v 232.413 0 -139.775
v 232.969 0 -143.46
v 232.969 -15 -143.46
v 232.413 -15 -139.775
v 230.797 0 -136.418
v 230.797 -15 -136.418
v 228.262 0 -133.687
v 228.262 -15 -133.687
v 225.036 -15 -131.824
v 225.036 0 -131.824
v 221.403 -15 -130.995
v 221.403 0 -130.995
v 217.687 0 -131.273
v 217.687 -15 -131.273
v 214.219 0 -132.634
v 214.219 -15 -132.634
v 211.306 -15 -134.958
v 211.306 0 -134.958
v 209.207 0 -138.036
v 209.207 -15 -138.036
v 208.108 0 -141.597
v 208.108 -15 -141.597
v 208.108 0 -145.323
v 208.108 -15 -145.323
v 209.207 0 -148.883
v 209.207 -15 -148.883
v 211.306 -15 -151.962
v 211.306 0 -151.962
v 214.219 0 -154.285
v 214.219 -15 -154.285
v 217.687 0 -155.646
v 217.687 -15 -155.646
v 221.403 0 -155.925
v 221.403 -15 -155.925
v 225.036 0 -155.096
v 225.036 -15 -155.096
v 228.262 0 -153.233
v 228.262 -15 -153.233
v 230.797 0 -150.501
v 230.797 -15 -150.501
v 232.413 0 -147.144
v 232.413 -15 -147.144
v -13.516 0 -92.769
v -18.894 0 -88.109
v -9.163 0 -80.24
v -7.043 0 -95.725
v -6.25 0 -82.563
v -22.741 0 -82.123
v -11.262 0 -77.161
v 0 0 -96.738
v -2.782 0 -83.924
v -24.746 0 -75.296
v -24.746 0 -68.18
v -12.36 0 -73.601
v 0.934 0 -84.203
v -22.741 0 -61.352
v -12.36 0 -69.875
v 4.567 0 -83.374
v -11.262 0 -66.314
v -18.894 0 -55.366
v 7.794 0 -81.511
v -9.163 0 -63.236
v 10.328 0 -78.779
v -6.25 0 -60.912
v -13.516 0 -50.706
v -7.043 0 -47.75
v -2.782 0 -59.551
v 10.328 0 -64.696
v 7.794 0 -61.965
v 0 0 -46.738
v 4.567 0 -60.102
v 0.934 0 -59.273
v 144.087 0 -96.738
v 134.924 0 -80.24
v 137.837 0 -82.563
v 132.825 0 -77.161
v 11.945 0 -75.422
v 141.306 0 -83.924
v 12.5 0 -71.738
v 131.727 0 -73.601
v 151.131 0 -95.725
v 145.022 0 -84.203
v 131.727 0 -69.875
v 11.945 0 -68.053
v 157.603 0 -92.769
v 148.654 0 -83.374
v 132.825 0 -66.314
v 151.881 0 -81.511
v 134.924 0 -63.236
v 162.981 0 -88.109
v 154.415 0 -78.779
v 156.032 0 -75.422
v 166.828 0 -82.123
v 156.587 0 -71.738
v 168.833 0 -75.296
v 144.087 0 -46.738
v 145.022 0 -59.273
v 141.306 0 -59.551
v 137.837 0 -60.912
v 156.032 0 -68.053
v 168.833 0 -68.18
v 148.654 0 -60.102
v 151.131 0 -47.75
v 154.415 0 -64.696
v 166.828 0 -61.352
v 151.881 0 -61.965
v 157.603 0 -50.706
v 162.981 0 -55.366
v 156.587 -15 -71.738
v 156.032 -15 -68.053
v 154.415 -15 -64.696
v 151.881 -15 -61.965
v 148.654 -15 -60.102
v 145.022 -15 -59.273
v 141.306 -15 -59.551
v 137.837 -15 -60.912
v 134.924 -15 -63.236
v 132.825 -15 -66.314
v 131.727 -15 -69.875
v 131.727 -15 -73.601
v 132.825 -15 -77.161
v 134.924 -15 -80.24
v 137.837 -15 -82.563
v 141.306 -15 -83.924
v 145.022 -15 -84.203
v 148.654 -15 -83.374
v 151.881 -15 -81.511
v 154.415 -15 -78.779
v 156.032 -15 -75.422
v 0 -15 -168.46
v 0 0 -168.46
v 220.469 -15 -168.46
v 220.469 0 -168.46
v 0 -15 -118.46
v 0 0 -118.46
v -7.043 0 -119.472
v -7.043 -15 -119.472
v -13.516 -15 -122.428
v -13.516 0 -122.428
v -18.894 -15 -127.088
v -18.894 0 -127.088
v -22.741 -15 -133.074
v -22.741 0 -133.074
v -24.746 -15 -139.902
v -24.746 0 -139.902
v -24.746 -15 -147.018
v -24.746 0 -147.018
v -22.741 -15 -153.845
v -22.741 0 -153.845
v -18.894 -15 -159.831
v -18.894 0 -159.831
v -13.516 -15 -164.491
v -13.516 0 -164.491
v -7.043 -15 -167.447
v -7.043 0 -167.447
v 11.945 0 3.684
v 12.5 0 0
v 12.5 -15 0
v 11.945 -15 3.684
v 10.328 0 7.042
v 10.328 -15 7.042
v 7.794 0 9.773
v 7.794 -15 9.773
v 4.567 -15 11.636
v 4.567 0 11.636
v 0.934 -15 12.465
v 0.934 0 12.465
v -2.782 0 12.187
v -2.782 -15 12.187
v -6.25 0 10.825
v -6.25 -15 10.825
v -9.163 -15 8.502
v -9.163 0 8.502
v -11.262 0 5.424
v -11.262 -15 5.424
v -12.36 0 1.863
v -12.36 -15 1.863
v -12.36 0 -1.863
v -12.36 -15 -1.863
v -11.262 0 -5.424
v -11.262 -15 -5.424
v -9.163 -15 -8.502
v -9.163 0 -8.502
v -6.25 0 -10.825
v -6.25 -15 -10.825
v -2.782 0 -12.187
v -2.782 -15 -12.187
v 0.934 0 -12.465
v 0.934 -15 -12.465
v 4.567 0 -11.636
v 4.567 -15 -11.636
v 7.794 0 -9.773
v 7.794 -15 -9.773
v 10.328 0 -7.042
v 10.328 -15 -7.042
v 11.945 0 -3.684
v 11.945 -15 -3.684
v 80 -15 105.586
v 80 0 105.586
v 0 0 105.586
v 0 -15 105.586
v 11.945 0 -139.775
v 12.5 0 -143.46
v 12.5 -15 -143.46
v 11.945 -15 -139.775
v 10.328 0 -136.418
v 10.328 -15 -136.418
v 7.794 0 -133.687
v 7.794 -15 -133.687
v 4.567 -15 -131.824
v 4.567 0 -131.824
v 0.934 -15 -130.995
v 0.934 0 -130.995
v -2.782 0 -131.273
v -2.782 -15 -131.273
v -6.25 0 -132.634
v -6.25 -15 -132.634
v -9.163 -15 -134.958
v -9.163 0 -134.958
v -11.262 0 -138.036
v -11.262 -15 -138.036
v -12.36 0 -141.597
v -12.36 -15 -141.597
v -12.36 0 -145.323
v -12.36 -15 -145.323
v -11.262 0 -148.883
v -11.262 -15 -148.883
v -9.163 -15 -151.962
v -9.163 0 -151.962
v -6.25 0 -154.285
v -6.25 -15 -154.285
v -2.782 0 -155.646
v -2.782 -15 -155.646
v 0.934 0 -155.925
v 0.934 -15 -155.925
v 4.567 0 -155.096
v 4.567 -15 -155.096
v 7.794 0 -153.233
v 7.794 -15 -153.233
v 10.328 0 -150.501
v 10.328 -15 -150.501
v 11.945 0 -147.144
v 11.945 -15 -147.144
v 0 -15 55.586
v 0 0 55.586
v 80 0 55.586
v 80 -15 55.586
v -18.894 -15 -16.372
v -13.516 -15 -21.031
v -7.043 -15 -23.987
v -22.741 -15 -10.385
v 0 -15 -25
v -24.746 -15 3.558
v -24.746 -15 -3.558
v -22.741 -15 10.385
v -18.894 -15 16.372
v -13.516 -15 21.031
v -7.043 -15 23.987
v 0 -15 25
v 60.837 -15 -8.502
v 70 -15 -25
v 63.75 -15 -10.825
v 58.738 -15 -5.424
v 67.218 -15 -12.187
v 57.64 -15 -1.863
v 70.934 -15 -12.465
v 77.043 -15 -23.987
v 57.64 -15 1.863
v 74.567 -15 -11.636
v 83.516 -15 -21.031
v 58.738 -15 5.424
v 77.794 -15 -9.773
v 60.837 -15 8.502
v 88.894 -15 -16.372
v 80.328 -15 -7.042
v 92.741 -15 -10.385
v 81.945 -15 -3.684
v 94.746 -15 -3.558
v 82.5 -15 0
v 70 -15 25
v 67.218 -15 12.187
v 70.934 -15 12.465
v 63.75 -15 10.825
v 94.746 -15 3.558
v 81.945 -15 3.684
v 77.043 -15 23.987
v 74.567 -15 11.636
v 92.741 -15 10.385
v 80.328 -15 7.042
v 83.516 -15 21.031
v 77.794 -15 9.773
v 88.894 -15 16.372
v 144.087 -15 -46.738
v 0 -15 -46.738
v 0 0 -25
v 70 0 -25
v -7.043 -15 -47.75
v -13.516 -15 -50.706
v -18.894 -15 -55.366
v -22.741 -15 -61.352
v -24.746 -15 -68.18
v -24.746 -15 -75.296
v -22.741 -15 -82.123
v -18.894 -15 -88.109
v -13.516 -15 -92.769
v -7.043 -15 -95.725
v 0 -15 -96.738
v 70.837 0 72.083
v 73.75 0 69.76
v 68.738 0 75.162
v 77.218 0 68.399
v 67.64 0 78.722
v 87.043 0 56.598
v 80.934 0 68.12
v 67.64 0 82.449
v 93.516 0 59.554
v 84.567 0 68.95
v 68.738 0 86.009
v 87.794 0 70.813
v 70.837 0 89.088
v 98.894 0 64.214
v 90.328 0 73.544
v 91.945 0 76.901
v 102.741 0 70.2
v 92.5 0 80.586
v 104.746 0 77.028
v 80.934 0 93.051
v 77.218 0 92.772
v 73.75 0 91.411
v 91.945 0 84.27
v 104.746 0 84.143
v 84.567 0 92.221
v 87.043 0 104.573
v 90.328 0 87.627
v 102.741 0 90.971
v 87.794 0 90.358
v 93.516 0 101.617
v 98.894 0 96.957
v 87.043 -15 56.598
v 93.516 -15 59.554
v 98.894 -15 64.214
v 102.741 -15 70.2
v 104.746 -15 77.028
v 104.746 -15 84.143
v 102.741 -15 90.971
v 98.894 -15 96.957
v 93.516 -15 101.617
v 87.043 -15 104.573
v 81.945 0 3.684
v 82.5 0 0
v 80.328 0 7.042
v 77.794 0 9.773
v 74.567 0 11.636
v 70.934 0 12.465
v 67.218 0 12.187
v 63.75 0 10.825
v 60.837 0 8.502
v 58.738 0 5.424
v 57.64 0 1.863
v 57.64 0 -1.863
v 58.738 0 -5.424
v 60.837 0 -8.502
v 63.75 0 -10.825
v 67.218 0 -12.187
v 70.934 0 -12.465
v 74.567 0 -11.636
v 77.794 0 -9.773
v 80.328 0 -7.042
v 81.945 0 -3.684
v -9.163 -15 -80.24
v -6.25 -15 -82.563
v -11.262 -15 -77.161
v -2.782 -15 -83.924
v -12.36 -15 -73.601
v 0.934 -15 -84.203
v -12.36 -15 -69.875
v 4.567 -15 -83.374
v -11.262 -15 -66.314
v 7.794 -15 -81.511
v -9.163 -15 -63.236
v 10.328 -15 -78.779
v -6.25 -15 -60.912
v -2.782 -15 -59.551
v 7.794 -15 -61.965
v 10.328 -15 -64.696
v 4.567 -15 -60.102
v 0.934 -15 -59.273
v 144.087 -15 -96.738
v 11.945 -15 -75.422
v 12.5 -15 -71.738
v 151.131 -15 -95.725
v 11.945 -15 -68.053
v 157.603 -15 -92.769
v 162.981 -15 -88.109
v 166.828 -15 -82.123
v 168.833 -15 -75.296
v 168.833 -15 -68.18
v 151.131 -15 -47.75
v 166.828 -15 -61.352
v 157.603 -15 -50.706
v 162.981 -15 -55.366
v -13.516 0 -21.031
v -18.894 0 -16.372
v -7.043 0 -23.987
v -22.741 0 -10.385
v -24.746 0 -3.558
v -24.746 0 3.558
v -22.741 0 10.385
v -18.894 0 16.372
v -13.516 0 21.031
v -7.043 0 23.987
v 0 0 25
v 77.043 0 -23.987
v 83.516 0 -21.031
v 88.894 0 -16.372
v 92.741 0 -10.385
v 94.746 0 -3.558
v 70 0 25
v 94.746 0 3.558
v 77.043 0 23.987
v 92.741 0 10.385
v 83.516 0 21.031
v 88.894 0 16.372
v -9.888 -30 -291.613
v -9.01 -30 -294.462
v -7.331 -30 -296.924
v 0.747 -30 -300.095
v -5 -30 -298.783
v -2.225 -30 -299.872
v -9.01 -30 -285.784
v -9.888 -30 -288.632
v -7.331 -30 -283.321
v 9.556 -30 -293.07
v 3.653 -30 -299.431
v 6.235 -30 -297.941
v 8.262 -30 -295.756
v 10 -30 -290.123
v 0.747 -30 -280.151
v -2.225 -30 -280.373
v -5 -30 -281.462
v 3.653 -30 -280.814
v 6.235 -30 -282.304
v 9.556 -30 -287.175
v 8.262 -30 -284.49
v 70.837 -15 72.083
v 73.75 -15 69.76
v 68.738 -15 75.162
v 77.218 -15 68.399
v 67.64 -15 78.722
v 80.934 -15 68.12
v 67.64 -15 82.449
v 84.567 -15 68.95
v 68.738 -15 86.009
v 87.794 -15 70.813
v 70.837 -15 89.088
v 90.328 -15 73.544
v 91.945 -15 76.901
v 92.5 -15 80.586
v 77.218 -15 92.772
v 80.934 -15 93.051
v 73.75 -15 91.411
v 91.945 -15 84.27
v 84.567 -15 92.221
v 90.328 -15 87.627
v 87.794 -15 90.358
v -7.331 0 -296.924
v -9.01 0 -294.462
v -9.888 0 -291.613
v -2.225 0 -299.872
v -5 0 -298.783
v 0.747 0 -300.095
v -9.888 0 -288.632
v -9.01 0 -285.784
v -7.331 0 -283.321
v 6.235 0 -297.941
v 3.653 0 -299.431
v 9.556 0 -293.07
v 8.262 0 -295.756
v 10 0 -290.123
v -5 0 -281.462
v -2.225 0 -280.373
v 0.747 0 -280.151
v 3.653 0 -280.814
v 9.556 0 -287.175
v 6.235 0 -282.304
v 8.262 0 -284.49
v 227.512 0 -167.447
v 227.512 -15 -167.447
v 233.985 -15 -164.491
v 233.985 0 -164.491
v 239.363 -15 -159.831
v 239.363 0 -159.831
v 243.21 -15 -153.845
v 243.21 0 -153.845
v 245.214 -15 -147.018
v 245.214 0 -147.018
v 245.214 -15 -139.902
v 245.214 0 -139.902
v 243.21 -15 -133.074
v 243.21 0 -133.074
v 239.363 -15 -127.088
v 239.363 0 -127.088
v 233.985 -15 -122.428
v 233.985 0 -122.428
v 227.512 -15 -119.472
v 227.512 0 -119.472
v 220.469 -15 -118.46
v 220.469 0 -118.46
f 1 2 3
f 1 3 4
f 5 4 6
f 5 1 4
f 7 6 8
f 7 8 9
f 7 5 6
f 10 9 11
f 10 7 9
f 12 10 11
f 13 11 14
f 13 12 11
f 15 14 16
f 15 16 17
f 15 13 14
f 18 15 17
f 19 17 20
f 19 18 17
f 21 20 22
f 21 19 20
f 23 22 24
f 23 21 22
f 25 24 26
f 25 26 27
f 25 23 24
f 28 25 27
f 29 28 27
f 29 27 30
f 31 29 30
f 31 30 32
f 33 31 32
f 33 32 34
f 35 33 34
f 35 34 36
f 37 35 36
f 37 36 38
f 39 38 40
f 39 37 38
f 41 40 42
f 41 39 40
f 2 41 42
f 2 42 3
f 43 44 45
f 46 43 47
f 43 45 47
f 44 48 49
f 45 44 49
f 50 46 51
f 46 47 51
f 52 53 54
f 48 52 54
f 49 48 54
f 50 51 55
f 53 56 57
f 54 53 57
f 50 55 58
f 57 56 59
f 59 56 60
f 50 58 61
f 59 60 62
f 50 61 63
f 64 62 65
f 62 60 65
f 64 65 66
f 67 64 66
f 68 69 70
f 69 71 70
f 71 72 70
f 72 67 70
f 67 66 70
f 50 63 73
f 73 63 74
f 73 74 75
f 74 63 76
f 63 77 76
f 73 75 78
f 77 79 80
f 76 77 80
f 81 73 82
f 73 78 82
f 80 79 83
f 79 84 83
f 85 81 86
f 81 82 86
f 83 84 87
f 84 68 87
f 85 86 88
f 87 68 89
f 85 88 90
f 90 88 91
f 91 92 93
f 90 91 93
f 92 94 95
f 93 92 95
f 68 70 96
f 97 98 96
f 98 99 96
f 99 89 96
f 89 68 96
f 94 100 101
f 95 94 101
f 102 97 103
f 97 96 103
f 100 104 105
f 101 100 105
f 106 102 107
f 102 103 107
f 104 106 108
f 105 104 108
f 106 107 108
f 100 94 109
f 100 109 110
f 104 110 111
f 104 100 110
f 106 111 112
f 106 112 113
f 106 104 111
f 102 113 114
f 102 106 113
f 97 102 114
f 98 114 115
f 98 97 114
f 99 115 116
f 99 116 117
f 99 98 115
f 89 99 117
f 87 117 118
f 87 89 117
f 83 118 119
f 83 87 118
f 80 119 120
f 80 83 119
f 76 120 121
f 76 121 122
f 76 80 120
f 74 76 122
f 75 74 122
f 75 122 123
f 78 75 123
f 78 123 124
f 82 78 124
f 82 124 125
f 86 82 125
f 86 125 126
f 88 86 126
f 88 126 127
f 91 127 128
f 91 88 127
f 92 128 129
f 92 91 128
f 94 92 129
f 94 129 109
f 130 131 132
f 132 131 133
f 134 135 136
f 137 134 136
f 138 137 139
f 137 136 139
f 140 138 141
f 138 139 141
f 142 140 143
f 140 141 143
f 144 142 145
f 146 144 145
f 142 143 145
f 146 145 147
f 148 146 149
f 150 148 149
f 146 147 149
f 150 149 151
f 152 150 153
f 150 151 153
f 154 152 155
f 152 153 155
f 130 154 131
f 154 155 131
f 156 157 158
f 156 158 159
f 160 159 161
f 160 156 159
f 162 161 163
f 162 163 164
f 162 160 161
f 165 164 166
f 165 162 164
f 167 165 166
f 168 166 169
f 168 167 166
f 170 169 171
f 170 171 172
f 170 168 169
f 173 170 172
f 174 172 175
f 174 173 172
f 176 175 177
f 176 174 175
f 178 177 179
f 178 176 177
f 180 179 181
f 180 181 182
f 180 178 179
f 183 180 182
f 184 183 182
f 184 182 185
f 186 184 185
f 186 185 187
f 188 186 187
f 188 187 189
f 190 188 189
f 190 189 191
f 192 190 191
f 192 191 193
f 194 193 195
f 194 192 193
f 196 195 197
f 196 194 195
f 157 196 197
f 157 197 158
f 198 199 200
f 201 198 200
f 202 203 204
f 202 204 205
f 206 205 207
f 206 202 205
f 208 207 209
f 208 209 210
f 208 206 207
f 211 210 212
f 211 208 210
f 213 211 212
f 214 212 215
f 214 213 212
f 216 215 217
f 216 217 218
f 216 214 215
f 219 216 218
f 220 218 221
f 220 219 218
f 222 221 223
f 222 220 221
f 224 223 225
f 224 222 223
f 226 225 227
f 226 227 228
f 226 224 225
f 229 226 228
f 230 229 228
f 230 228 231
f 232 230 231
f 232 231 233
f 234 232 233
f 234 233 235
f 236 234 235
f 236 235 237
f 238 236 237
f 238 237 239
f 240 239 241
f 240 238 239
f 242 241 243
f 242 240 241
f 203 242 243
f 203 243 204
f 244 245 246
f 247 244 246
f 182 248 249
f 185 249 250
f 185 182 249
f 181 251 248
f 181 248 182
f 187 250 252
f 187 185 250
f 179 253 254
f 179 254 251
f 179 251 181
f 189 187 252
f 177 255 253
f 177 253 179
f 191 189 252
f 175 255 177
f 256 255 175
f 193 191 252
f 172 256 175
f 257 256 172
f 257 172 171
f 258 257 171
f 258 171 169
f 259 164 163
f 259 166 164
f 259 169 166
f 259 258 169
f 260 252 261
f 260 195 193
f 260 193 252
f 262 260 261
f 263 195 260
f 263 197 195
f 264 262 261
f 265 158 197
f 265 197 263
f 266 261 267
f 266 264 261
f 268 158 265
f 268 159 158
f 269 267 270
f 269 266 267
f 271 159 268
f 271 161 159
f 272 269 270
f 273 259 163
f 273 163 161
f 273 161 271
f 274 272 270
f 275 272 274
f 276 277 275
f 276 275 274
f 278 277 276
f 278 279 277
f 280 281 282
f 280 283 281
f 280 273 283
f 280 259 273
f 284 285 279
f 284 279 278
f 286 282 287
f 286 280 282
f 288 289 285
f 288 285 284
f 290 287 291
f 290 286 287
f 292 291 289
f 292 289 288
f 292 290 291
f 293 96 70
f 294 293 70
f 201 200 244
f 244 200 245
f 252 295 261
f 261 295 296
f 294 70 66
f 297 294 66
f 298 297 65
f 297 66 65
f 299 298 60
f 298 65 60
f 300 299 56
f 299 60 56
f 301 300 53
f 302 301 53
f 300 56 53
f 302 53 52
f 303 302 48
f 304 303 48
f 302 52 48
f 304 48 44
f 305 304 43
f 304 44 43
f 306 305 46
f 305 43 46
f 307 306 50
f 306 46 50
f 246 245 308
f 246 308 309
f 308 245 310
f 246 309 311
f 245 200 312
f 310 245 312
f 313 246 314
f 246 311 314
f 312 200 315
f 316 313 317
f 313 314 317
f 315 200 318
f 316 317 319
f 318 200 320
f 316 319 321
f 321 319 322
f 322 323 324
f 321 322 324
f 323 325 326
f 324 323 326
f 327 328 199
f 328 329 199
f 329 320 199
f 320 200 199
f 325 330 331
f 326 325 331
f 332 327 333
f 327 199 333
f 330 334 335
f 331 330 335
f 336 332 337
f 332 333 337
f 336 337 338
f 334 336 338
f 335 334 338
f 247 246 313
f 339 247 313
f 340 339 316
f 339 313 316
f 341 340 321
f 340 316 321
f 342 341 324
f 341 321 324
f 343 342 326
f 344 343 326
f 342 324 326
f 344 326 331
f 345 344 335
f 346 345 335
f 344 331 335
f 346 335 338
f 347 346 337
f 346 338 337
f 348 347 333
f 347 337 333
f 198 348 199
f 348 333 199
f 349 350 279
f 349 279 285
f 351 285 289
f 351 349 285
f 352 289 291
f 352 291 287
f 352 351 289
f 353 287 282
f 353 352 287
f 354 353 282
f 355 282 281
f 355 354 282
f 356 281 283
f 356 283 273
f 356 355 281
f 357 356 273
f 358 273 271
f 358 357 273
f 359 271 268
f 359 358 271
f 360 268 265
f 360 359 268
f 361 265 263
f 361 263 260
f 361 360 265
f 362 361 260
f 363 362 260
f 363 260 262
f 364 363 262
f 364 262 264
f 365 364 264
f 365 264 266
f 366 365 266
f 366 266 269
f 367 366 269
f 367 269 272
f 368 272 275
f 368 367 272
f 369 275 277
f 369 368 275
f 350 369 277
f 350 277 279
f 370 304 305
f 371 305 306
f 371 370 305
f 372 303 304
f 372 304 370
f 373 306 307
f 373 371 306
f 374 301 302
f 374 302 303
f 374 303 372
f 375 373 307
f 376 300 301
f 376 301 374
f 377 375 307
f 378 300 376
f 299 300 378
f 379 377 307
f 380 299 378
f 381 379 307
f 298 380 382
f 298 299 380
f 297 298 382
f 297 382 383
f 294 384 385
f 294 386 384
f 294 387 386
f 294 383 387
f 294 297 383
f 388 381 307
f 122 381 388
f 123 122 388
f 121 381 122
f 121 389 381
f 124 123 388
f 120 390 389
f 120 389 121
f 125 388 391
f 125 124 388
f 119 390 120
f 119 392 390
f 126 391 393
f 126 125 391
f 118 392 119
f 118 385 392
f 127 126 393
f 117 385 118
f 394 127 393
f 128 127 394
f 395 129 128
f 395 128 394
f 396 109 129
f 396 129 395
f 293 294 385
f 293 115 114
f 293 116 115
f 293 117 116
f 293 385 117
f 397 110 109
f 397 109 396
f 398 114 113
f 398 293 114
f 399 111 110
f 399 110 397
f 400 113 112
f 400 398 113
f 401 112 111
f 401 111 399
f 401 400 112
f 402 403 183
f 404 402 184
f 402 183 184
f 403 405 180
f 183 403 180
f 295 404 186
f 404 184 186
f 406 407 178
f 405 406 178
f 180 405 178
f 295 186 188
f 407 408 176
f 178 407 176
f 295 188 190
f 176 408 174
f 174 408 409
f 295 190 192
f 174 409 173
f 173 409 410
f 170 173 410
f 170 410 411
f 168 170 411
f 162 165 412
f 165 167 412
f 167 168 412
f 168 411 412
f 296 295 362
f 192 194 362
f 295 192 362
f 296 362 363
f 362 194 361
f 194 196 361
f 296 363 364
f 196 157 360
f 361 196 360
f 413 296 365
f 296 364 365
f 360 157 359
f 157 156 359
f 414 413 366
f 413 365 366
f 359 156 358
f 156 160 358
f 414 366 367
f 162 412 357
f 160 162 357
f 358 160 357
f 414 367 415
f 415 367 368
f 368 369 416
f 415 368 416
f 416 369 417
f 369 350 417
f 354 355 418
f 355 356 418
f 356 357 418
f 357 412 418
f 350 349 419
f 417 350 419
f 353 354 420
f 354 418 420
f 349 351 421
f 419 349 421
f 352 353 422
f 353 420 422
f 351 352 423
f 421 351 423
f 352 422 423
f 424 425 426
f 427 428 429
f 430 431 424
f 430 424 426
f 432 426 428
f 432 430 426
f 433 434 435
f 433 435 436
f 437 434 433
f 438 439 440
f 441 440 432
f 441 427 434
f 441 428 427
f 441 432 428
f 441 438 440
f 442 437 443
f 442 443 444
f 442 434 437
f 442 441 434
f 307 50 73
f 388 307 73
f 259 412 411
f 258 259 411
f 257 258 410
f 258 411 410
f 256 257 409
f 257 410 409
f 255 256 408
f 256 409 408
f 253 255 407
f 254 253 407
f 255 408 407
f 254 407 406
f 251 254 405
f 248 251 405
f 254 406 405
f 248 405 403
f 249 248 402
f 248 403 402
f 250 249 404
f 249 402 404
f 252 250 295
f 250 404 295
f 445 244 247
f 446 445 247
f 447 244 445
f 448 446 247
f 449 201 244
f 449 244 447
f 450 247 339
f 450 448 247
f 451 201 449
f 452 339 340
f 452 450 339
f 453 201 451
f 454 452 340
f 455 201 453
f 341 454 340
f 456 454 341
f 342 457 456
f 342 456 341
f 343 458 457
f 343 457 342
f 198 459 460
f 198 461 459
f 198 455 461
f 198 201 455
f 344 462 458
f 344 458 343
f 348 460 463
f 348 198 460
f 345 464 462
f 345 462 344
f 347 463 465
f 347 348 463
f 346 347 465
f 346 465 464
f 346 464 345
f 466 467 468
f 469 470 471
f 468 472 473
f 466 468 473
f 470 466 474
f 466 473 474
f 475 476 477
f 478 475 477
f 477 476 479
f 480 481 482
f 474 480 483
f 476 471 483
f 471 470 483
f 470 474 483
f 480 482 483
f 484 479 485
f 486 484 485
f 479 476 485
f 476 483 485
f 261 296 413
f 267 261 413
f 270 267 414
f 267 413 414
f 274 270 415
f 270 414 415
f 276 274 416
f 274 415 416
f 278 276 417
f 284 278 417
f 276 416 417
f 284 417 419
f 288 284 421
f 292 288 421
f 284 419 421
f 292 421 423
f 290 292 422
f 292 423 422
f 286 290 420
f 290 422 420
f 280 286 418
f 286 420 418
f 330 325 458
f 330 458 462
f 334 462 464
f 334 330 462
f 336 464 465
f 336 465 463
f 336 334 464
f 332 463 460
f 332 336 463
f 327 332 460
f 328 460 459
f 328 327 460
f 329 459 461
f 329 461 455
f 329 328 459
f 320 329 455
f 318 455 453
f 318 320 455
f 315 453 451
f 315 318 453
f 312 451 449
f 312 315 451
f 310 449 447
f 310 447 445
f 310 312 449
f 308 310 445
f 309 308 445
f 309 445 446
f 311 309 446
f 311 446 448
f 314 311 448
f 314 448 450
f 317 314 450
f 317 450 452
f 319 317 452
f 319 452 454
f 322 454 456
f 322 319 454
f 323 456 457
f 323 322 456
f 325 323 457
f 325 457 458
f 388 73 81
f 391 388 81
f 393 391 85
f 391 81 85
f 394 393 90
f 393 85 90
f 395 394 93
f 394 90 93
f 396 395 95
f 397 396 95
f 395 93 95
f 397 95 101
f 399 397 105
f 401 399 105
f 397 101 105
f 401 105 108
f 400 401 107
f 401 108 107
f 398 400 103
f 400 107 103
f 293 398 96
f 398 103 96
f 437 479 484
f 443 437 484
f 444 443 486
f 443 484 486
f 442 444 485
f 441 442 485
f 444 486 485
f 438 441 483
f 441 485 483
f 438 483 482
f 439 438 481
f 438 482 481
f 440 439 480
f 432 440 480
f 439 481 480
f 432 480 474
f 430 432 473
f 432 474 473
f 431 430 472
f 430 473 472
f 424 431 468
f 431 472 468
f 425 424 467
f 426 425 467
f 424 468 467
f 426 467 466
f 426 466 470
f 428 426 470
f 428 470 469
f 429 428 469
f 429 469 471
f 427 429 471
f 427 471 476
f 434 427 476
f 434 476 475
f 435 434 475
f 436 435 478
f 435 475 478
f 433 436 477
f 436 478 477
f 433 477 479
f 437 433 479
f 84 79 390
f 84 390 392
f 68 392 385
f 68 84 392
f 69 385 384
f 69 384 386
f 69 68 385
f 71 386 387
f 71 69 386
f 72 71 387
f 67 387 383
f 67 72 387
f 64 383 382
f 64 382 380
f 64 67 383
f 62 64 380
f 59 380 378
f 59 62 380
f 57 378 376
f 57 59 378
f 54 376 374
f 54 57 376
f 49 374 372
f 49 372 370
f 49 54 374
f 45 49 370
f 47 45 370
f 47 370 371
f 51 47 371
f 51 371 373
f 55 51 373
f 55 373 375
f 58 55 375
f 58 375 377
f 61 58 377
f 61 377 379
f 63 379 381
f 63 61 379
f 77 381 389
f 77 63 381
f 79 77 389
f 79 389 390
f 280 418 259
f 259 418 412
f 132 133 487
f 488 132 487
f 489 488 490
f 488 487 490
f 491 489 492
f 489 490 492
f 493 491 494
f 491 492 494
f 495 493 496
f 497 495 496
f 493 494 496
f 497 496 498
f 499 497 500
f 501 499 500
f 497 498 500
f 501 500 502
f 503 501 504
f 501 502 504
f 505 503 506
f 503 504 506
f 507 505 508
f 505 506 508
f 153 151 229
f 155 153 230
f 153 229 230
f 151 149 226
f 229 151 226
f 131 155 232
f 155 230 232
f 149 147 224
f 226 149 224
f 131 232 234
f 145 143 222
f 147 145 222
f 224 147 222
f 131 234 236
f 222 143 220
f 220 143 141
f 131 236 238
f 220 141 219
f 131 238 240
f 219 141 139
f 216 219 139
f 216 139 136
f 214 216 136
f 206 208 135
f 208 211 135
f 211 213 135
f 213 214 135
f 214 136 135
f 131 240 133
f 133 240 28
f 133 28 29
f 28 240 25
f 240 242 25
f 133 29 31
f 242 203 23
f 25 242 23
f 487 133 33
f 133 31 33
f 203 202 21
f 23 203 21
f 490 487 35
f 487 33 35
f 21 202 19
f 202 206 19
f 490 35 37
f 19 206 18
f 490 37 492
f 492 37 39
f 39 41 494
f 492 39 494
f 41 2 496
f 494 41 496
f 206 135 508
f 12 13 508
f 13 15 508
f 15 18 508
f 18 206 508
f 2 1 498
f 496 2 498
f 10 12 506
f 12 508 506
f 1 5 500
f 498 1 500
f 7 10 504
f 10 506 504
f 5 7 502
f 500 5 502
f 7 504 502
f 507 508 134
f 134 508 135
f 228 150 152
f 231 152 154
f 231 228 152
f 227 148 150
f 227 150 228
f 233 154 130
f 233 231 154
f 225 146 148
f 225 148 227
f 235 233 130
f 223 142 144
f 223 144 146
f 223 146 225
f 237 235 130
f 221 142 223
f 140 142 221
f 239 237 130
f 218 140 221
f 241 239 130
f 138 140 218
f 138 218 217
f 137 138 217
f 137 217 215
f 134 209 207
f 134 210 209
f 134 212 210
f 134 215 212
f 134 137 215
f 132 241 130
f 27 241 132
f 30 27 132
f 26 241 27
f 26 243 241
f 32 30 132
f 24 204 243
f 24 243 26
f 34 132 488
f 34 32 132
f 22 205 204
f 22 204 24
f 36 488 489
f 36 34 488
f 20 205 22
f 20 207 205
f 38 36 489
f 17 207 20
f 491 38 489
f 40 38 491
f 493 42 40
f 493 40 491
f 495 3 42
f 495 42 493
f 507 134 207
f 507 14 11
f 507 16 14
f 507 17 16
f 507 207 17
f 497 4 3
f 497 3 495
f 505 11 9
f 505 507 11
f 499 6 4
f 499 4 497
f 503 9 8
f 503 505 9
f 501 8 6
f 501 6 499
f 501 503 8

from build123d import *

# Parameters (mm, degrees)
F0_R     = 12.5
F1_DEPTH = 15
F2_R     = 12.5
F3_DEPTH = 15
F4_R     = 12.5
F5_DEPTH = 15
F6_R     = 12.5
F7_DEPTH = 15
F8_R     = 10
F9_DEPTH = 30


with BuildPart() as f1:
    # F0 (on Front) → F1 (new body)
    with BuildSketch(Plane.XZ):
        with BuildLine():
            Line((70, 25), (0, 25))
            ThreePointArc((0, 25), (-25, 0), (0, -25))
            Line((0, -25), (70, -25))
            ThreePointArc((70, -25), (95, 0), (70, 25))
        make_face()
        Circle(F0_R, mode=Mode.SUBTRACT)
        with Locations((70, 0)):
            Circle(F0_R, mode=Mode.SUBTRACT)
    extrude(amount=F1_DEPTH)


with BuildPart() as f3:
    # F2 (on Front) → F3 (new body)
    with BuildSketch(Plane.XZ):
        with BuildLine():
            Line((80, 105.585515), (0, 105.585515))
            Line((0, 105.585515), (0, 55.585515))
            Line((0, 55.585515), (80, 55.585515))
            ThreePointArc((80, 55.585515), (105, 80.585515), (80, 105.585515))
        make_face()
        with Locations((80, 80.585515)):
            Circle(F2_R, mode=Mode.SUBTRACT)
    extrude(amount=F3_DEPTH)


with BuildPart() as f5:
    # F4 (on Front) → F5 (new body)
    with BuildSketch(Plane.XZ):
        with BuildLine():
            Line((72.043687, -46.737686), (0, -46.737686))
            ThreePointArc((0, -46.737686), (-25, -71.737686), (0, -96.737686))
            Line((0, -96.737686), (72.043687, -96.737686))
            Line((72.043687, -96.737686), (144.087374, -96.737686))
            ThreePointArc((144.087374, -96.737686), (169.087374, -71.737686), (144.087374, -46.737686))
            Line((144.087374, -46.737686), (72.043687, -46.737686))
        make_face()
        with Locations((0, -71.737686)):
            Circle(F4_R, mode=Mode.SUBTRACT)
        with Locations((144.087374, -71.737686)):
            Circle(F4_R, mode=Mode.SUBTRACT)
    extrude(amount=F5_DEPTH)


with BuildPart() as f7:
    # F6 (on Front) → F7 (new body)
    with BuildSketch(Plane.XZ):
        with BuildLine():
            Line((110.234387, -118.459767), (0, -118.459767))
            ThreePointArc((0, -118.459767), (-25, -143.459767), (0, -168.459767))
            Line((0, -168.459767), (110.234387, -168.459767))
            Line((110.234387, -168.459767), (220.468774, -168.459767))
            ThreePointArc((220.468774, -168.459767), (245.468774, -143.459767), (220.468774, -118.459767))
            Line((220.468774, -118.459767), (110.234387, -118.459767))
        make_face()
        with Locations((0, -143.459767)):
            Circle(F6_R, mode=Mode.SUBTRACT)
        with Locations((220.468774, -143.459767)):
            Circle(F6_R, mode=Mode.SUBTRACT)
    extrude(amount=F7_DEPTH)


with BuildPart() as f9:
    # F8 (on Front) → F9 (new body)
    with BuildSketch(Plane.XZ):
        with Locations((0, -290.122747)):
            Circle(F8_R)
    extrude(amount=F9_DEPTH)


solid = Compound([f1.part, f3.part, f5.part, f7.part, f9.part])
